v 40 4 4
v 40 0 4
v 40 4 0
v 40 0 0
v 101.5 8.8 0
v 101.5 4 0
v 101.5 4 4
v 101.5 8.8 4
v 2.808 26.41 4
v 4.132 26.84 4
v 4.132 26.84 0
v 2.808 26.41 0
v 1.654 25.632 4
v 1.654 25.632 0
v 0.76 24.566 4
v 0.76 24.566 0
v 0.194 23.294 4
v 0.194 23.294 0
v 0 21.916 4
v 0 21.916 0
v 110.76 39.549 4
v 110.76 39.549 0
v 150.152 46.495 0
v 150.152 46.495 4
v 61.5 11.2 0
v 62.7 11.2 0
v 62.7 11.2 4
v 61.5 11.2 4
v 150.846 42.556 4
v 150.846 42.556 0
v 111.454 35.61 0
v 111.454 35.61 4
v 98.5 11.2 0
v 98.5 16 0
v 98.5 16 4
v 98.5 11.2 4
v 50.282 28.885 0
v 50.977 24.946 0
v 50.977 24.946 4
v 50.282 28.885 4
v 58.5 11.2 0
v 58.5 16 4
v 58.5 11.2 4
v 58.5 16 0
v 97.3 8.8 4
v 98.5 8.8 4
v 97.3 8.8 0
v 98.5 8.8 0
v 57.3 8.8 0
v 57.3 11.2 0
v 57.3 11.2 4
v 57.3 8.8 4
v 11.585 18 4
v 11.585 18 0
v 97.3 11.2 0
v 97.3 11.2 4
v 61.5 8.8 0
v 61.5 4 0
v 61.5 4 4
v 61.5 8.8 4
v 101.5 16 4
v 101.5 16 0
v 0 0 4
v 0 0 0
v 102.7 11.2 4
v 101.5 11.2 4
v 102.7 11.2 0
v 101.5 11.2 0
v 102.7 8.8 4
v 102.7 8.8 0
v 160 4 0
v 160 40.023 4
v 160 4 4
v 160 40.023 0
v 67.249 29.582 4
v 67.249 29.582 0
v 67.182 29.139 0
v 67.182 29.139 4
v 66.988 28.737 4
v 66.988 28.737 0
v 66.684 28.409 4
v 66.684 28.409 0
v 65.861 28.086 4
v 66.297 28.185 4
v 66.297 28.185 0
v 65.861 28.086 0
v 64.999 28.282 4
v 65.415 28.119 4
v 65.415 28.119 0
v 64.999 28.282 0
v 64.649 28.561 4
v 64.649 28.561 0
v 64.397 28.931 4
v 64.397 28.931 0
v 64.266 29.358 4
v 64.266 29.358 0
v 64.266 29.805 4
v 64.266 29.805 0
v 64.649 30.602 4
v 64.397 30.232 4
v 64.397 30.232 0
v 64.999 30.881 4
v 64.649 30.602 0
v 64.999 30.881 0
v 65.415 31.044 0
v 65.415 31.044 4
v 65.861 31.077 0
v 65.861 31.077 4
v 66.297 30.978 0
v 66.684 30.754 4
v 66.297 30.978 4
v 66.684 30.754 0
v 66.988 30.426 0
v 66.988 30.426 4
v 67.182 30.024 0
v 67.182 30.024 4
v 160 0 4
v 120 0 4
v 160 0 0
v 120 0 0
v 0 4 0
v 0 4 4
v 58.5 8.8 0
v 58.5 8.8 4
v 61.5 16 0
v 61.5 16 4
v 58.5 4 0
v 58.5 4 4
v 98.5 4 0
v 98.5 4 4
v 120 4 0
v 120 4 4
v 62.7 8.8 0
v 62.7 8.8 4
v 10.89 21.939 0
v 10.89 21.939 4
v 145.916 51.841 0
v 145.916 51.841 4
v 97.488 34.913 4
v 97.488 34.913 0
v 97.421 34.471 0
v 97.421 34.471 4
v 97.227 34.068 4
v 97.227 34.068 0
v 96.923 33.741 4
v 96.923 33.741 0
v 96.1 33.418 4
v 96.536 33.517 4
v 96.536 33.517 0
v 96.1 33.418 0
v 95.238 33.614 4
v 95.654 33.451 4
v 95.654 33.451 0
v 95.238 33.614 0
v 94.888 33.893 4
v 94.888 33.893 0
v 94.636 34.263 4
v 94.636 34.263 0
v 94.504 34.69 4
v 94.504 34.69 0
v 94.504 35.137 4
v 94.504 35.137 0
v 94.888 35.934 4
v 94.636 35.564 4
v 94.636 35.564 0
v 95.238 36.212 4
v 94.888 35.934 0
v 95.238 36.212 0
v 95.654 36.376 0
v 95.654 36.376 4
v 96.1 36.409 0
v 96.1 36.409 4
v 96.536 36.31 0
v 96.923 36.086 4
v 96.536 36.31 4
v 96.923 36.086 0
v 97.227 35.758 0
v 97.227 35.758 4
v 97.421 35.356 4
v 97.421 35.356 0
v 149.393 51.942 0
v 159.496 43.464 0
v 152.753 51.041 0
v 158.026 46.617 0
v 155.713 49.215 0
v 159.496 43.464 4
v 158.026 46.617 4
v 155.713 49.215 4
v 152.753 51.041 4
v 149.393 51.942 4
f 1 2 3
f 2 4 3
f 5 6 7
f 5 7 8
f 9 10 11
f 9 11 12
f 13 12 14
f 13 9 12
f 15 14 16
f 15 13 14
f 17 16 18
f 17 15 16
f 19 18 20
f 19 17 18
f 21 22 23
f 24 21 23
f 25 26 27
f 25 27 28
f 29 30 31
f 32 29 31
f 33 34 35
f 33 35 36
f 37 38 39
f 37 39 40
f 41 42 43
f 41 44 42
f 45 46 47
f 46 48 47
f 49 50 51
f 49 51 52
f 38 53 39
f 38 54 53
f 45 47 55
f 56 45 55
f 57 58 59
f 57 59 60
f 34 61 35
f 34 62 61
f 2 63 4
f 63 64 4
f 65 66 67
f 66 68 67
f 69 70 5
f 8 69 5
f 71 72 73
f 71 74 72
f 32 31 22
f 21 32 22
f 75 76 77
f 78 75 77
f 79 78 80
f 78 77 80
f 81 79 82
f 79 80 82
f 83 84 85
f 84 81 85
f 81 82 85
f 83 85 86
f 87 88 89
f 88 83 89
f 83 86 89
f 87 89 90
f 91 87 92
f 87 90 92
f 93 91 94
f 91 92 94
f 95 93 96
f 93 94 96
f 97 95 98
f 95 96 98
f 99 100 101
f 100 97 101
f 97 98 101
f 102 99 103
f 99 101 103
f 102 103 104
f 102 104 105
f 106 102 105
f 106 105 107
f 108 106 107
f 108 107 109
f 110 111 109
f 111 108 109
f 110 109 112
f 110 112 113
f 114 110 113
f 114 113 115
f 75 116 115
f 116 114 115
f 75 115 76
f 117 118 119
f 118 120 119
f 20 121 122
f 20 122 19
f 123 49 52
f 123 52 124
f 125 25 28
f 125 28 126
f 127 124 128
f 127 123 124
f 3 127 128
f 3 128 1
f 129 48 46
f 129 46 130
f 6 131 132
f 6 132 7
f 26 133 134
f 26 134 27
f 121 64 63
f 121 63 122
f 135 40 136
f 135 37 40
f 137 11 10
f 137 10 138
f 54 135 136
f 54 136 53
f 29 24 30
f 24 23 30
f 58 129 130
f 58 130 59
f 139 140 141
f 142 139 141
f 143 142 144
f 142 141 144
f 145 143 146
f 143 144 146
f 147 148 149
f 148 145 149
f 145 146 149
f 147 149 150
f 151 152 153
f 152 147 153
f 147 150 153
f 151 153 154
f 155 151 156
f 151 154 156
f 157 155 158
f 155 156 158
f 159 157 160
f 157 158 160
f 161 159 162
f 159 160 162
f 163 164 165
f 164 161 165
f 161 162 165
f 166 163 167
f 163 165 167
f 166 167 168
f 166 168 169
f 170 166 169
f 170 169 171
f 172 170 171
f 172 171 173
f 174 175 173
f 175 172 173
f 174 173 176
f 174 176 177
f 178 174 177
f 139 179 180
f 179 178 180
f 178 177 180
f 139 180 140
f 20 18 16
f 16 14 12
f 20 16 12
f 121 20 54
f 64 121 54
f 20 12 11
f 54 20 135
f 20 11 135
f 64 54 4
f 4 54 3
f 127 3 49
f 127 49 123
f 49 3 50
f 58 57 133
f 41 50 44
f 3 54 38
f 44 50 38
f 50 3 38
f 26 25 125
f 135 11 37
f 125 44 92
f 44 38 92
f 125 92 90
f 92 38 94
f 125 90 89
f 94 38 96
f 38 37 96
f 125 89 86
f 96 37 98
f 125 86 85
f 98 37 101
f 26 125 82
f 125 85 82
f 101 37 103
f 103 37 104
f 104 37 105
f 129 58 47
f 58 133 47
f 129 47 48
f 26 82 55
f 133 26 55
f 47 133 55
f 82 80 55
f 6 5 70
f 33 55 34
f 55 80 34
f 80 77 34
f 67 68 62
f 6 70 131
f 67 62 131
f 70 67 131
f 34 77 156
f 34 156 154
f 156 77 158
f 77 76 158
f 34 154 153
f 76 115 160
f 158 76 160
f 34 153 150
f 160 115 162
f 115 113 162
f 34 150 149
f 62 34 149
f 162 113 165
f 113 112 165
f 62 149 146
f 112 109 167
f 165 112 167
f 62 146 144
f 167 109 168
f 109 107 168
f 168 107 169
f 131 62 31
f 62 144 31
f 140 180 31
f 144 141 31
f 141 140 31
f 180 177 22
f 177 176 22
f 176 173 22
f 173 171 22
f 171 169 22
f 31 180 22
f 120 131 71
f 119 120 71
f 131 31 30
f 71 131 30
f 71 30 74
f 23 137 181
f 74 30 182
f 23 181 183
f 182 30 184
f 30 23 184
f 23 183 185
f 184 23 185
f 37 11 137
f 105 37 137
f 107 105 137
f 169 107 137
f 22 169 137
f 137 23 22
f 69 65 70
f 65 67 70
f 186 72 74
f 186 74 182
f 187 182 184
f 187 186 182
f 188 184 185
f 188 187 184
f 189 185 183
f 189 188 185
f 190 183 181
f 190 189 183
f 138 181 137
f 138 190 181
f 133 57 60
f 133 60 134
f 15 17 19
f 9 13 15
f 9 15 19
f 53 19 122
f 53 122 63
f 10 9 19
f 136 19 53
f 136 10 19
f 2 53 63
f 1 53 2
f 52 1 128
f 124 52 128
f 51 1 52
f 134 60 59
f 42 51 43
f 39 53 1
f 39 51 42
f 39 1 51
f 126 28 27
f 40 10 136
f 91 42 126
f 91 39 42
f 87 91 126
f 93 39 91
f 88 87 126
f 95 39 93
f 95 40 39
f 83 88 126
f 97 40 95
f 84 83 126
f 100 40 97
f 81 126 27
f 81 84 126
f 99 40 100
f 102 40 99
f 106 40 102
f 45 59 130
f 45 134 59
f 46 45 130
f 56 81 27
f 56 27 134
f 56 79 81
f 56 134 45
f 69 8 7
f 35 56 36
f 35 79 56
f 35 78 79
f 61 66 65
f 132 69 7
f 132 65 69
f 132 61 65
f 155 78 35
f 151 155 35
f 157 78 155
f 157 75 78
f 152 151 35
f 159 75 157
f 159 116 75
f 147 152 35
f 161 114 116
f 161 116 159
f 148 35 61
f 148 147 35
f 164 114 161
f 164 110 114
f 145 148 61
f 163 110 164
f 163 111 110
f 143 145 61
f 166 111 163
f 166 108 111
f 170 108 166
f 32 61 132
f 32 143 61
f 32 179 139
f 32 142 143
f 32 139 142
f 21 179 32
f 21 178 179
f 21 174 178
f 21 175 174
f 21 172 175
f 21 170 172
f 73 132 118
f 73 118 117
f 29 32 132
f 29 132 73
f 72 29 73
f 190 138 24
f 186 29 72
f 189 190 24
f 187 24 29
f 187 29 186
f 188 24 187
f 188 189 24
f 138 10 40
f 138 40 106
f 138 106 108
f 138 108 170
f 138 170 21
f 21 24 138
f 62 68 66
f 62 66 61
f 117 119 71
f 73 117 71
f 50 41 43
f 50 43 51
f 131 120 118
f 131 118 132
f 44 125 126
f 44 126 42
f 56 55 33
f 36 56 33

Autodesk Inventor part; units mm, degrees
ref_plane "YZ Plane" through (0, 0, 0) normal (1, 0, 0) x (0, 1, 0)
ref_plane "XZ Plane" through (0, 0, 0) normal (0, 1, 0) x (-1, 0, 0)
ref_plane "XY Plane" through (0, 0, 0) normal (0, 0, 1) x (1, 0, 0)
sketch "Sketch1" plane through (0, 0, 0) normal (0, 0, 1) x (1, 0, 0)
  line L0 (0, 0) -> (40, 0) projected
  line L1 (40, 0) -> (40, 4) projected
  line L2 (0, 4) -> (40, 4) construction
  line L3 (0, 0) -> (0, 4) projected
  line L4 (120, 0) -> (160, 0) projected
  line L5 (160, 0) -> (160, 4) projected
  line L6 (120, 4) -> (160, 4) construction
  line L7 (120, 0) -> (120, 4) projected
  line L8 (0, 4) -> (0, 26.1116)
  line L9 (0, 26.1116) -> (160, 54.3239)
  line L10 (160, 54.3239) -> (160, 4)
  line L11 (120, 4) -> (101.5, 4)
  line L12 (61.5, 4) -> (61.5, 0) construction
  line L13 (58.5, 4) -> (58.5, 0) construction
  line L14 (98.5, 4) -> (98.5, 0) construction
  line L15 (101.5, 4) -> (101.5, 0) construction
  line L16 (58.5, 4) -> (61.5, 4) construction
  line L17 (61.5, 4) -> (61.5, 16)
  line L18 (61.5, 16) -> (58.5, 16)
  line L19 (58.5, 16) -> (58.5, 4)
  line L20 (57.3, 8.8) -> (62.7, 8.8)
  line L21 (62.7, 8.8) -> (62.7, 11.2)
  line L22 (62.7, 11.2) -> (57.3, 11.2)
  line L23 (57.3, 11.2) -> (57.3, 8.8)
  line L24 (98.5, 4) -> (101.5, 4) construction
  line L25 (101.5, 4) -> (101.5, 16)
  line L26 (101.5, 16) -> (98.5, 16)
  line L27 (98.5, 16) -> (98.5, 4)
  line L28 (102.7, 8.8) -> (97.3, 8.8)
  line L29 (97.3, 8.8) -> (97.3, 11.2)
  line L30 (97.3, 11.2) -> (102.7, 11.2)
  line L31 (102.7, 11.2) -> (102.7, 8.8)
  line L32 (58.5, 4) -> (40, 4)
  line L33 (61.5, 4) -> (58.5, 4)
  line L34 (98.5, 4) -> (61.5, 4)
  line L35 (101.5, 4) -> (98.5, 4)
  line L36 (11.5846, 18) -> (50.9769, 24.9459)
  line L37 (50.9769, 24.9459) -> (50.2823, 28.8852)
  line L38 (50.2823, 28.8852) -> (10.89, 21.9392)
  line L39 (10.89, 21.9392) -> (11.5846, 18)
  line L40 (110.7596, 39.5489) -> (150.1519, 46.4949)
  line L41 (150.1519, 46.4949) -> (150.8465, 42.5556)
  line L42 (150.8465, 42.5556) -> (111.4542, 35.6097)
  line L43 (111.4542, 35.6097) -> (110.7596, 39.5489)
  line L44 (150.1519, 46.4949) -> (160, 48.2314) construction
  line L45 (50.6296, 26.9155) -> (65.7489, 29.5815) construction
  line L46 (65.7489, 29.5815) -> (80.8682, 32.2474) construction
  line L47 (80.8682, 32.2474) -> (95.9876, 34.9134) construction
  line L48 (95.9876, 34.9134) -> (111.1069, 37.5793) construction
  circle A0 centre (65.7489, 29.5815) radius 1.5
  circle A1 centre (95.9876, 34.9134) radius 1.5
  point P0 (60, 11.2)
  point P1 (60, 16)
  point P2 (62.7, 10)
  point P3 (61.5, 10)
  point P4 (100, 11.2)
  point P5 (100, 16)
  point P6 (58.5, 8.8)
  point P7 (58.5, 11.2)
  point P8 (61.5, 11.2)
  point P9 (61.5, 8.8)
  point P10 (98.5, 8.8)
  point P11 (98.5, 11.2)
  point P12 (101.5, 11.2)
  point P13 (101.5, 8.8)
  dimension "d0" = 3
  dimension "d1" = 12
  dimension "d2" = 5.4
  dimension "d3" = 2.4
  dimension "d4" = 10
  dimension "d6" = 40
  dimension "d7" = 3
  dimension "d9" = 4
  dimension "d10" = 14
  dimension "d11" = 6
  dimension "d12" = 10
  dimension "d13" = 10
extrude "Extrusion1" add sketch "Sketch1" along normal blind 4 contours L3 L8 L9 L10 L5 L4 L7 L11 L25 L28 L31 L30 L26 L27 L29 L34 L17 L20 L21 L22 L18 L19 L23 L32 L1 L0
fillet "Fillet1" radius 12 1 edges at (160, 54.3239, 2)
fillet "Fillet2" radius 5 1 edges at (0, 26.1116, 2)
properties part number "Pannel_Side" material "MDF Medium Density Fiberboard"
